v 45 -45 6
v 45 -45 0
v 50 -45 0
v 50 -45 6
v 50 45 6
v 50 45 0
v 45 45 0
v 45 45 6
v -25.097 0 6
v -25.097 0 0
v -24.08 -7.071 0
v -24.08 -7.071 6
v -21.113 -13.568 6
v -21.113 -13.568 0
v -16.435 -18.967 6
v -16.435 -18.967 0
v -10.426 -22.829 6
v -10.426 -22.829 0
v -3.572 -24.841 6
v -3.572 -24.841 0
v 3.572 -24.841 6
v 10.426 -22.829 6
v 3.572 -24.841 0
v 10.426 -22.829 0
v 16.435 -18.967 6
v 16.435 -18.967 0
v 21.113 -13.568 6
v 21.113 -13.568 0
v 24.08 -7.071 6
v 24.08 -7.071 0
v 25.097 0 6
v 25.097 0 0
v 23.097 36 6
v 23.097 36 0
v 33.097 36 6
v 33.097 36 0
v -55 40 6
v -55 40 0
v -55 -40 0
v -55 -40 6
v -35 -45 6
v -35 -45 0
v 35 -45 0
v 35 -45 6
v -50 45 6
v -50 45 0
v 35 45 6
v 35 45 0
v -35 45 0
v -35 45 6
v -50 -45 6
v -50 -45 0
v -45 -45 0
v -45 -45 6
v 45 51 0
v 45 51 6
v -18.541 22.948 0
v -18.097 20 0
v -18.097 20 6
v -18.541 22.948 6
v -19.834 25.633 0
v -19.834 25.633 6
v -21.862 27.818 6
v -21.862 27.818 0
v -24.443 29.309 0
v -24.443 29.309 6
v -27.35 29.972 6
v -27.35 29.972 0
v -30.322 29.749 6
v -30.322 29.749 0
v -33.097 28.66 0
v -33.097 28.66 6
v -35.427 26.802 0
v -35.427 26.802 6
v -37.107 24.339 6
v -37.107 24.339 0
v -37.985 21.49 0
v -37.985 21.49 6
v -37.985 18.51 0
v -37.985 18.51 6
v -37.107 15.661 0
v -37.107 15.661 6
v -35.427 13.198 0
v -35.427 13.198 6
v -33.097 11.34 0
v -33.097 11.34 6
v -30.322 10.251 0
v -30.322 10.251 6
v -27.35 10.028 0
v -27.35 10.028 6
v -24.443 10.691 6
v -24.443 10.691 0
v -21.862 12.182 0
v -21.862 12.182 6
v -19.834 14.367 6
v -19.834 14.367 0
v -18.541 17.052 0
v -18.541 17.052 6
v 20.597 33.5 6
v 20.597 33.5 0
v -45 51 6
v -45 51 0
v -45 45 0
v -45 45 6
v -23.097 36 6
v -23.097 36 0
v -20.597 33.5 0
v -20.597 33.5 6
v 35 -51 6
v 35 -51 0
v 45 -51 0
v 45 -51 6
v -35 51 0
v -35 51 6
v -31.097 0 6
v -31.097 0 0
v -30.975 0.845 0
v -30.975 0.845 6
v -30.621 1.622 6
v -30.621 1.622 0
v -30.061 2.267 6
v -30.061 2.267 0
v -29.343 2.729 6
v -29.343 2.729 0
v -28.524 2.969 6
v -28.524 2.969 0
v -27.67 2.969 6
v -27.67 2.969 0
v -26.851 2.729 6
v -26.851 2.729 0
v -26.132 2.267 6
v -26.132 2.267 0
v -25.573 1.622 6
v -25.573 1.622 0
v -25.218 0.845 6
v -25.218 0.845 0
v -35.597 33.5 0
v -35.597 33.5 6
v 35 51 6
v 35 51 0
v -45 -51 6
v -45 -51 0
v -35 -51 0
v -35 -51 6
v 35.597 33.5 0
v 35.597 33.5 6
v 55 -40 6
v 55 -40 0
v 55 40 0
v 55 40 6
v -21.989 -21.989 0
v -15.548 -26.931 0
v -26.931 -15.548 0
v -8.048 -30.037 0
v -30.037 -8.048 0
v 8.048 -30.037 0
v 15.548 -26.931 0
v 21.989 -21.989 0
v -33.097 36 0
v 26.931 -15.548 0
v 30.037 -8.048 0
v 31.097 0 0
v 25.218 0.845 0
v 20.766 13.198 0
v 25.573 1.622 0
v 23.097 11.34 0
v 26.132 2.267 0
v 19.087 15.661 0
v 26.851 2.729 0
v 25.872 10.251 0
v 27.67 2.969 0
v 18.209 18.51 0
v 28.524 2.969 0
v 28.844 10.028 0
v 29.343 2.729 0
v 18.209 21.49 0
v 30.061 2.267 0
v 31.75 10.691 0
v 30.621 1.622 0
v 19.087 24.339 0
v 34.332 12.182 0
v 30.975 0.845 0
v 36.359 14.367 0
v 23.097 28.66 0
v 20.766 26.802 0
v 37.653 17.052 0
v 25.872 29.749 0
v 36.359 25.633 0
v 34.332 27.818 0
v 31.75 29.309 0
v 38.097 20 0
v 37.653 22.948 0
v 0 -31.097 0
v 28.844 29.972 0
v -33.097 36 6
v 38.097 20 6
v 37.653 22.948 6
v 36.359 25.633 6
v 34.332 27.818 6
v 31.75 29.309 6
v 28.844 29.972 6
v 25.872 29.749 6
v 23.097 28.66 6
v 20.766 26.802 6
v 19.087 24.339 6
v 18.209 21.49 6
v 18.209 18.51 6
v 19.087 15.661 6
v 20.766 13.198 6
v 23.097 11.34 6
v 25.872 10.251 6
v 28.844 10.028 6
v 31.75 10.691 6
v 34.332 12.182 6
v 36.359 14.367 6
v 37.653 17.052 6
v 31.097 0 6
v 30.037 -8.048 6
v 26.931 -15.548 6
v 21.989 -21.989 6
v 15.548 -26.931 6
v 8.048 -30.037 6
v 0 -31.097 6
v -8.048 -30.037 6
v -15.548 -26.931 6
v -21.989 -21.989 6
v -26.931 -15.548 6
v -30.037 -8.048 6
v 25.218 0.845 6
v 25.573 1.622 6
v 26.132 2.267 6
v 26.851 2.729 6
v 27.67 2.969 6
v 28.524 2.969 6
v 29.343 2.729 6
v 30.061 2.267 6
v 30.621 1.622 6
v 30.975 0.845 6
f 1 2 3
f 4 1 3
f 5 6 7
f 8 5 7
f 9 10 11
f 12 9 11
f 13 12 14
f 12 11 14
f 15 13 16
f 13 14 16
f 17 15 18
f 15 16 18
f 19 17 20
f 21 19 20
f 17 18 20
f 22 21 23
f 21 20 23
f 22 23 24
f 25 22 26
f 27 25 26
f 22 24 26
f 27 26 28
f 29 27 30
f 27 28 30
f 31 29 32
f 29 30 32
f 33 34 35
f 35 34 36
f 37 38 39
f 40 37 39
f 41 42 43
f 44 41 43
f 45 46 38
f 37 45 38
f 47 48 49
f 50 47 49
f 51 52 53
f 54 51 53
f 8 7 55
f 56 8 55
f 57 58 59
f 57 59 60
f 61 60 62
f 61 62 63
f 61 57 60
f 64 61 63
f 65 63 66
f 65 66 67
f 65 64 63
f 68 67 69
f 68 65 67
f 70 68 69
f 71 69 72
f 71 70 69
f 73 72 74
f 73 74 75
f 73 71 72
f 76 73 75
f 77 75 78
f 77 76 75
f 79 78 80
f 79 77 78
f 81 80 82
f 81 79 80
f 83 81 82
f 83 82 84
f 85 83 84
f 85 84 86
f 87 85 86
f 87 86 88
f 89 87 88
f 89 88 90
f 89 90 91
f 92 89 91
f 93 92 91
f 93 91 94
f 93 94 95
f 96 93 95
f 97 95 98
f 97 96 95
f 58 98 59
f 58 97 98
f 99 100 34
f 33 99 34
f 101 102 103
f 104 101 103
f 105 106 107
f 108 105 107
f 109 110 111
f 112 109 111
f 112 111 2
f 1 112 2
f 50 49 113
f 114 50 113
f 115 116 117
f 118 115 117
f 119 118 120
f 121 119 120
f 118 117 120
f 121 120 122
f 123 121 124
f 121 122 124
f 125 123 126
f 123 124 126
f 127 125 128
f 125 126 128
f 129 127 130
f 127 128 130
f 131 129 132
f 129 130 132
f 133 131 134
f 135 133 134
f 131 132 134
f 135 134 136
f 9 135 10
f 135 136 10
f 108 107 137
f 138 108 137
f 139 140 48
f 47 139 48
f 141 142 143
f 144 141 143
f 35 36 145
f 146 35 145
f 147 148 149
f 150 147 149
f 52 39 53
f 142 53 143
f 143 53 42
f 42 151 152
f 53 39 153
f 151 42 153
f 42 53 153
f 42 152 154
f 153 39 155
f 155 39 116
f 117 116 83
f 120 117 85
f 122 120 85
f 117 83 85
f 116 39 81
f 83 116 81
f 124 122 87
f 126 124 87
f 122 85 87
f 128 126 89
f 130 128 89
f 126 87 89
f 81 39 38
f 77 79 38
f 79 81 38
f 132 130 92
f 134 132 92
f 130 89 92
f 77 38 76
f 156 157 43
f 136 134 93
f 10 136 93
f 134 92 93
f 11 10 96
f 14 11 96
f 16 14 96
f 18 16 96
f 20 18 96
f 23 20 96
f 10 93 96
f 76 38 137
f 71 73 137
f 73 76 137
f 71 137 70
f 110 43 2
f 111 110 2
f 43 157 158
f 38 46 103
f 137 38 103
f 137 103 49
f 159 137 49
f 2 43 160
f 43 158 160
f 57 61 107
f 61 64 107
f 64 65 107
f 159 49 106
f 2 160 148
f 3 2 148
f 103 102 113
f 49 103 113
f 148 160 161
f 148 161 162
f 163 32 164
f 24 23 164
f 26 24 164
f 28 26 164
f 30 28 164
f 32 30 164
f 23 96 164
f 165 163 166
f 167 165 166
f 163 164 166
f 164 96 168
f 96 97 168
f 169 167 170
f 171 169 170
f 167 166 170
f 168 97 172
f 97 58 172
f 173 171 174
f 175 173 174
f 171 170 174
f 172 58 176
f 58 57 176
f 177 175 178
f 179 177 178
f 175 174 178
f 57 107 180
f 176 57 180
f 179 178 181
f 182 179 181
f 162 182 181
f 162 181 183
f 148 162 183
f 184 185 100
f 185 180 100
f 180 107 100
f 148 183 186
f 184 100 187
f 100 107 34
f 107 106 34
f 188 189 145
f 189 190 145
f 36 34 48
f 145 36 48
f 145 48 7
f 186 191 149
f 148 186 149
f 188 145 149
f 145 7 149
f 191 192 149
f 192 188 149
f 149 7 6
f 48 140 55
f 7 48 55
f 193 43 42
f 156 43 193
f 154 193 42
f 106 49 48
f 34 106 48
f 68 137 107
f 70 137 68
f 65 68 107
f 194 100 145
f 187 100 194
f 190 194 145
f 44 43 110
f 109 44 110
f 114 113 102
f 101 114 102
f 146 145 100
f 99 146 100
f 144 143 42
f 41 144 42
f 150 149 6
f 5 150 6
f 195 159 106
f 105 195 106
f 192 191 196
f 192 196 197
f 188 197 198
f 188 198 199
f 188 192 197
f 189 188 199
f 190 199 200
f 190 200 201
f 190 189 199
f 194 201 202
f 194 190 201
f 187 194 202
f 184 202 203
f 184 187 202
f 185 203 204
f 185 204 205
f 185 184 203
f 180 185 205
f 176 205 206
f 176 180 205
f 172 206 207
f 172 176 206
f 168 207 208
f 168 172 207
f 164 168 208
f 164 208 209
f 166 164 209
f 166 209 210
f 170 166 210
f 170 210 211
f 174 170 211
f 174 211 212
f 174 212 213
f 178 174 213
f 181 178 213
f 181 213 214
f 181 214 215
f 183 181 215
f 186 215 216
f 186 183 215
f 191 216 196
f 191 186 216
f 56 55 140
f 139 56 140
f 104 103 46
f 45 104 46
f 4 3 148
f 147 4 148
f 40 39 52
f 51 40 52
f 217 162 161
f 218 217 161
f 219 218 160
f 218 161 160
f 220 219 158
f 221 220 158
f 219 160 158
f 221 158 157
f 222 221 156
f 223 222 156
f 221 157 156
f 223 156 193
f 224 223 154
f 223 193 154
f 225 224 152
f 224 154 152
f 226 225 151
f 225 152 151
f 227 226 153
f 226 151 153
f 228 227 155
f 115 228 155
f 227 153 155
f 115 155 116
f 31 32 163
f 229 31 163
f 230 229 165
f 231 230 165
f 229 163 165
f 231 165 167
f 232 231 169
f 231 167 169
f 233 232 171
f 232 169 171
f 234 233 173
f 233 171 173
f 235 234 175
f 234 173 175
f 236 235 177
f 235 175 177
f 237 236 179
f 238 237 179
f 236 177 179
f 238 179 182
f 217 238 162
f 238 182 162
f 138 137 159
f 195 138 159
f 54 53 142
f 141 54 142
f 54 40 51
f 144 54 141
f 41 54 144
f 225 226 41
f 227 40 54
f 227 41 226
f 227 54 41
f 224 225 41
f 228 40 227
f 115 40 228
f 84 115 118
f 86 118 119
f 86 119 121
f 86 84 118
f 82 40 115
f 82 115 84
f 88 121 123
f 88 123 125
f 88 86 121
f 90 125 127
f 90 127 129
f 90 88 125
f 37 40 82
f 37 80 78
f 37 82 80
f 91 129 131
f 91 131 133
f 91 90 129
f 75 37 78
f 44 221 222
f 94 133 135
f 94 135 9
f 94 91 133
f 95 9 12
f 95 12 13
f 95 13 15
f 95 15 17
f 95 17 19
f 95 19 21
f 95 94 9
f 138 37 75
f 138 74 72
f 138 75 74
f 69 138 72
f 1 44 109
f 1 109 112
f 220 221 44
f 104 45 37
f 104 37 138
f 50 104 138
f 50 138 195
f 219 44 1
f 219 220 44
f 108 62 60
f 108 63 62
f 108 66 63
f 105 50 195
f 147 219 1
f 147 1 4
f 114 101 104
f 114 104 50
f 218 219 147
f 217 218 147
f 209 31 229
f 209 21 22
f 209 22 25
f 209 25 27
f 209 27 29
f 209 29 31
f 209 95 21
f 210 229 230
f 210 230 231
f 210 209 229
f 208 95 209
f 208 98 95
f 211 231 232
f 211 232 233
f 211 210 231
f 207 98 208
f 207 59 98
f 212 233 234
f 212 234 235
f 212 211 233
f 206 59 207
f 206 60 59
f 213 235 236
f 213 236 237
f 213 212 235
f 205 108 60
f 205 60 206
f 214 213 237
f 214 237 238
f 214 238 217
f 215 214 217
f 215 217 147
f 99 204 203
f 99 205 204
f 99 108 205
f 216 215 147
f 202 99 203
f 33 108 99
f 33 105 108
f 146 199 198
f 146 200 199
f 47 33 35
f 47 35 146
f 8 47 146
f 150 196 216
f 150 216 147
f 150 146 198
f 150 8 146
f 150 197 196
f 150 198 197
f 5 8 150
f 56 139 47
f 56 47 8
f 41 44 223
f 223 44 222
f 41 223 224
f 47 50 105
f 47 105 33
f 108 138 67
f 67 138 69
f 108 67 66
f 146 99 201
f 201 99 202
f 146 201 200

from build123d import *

# Parameters (mm, degrees)
SKETCH1_R           = 10
BOSS_EXTRUDE2_DEPTH = 6


with BuildPart() as part:
    # Sketch1 → Boss-Extrude2 (new body)
    with BuildSketch(Plane.XY):
        Polygon((-35, 51), (-45, 51), (-45, 45), (-50, 45), (-55, 40), (-55, -40), (-50, -45), (-45, -45), (-45, -51), (-35, -51), (-35, -45), (35, -45), (35, -51), (45, -51), (45, -45), (50, -45), (55, -40), (55, 40), (50, 45), (45, 45), (45, 51), (35, 51), (35, 45), (-35, 45), align=None)
        Polygon((33.096829988, 36), (35.596829988, 33.5), (20.596829988, 33.5), (23.096829988, 36), align=None, mode=Mode.SUBTRACT)
        with BuildLine():
            ThreePointArc((31.096829988, 0), (0, -31.096829988), (-31.096829988, 0))
            ThreePointArc((-31.096829988, 0), (-28.096829988, 3), (-25.096829988, 0))
            ThreePointArc((-25.096829988, 0), (0, -25.096829988), (25.096829988, 0))
            ThreePointArc((25.096829988, 0), (28.096829988, 3), (31.096829988, 0))
        make_face(mode=Mode.SUBTRACT)
        with Locations((-28.096829988, 20)):
            Circle(SKETCH1_R, mode=Mode.SUBTRACT)
        Polygon((-35.596829988, 33.5), (-33.096829988, 36), (-23.096829988, 36), (-20.596829988, 33.5), align=None, mode=Mode.SUBTRACT)
        with Locations((28.096829988, 20)):
            Circle(SKETCH1_R, mode=Mode.SUBTRACT)
    extrude(amount=BOSS_EXTRUDE2_DEPTH)


solid = part.part
